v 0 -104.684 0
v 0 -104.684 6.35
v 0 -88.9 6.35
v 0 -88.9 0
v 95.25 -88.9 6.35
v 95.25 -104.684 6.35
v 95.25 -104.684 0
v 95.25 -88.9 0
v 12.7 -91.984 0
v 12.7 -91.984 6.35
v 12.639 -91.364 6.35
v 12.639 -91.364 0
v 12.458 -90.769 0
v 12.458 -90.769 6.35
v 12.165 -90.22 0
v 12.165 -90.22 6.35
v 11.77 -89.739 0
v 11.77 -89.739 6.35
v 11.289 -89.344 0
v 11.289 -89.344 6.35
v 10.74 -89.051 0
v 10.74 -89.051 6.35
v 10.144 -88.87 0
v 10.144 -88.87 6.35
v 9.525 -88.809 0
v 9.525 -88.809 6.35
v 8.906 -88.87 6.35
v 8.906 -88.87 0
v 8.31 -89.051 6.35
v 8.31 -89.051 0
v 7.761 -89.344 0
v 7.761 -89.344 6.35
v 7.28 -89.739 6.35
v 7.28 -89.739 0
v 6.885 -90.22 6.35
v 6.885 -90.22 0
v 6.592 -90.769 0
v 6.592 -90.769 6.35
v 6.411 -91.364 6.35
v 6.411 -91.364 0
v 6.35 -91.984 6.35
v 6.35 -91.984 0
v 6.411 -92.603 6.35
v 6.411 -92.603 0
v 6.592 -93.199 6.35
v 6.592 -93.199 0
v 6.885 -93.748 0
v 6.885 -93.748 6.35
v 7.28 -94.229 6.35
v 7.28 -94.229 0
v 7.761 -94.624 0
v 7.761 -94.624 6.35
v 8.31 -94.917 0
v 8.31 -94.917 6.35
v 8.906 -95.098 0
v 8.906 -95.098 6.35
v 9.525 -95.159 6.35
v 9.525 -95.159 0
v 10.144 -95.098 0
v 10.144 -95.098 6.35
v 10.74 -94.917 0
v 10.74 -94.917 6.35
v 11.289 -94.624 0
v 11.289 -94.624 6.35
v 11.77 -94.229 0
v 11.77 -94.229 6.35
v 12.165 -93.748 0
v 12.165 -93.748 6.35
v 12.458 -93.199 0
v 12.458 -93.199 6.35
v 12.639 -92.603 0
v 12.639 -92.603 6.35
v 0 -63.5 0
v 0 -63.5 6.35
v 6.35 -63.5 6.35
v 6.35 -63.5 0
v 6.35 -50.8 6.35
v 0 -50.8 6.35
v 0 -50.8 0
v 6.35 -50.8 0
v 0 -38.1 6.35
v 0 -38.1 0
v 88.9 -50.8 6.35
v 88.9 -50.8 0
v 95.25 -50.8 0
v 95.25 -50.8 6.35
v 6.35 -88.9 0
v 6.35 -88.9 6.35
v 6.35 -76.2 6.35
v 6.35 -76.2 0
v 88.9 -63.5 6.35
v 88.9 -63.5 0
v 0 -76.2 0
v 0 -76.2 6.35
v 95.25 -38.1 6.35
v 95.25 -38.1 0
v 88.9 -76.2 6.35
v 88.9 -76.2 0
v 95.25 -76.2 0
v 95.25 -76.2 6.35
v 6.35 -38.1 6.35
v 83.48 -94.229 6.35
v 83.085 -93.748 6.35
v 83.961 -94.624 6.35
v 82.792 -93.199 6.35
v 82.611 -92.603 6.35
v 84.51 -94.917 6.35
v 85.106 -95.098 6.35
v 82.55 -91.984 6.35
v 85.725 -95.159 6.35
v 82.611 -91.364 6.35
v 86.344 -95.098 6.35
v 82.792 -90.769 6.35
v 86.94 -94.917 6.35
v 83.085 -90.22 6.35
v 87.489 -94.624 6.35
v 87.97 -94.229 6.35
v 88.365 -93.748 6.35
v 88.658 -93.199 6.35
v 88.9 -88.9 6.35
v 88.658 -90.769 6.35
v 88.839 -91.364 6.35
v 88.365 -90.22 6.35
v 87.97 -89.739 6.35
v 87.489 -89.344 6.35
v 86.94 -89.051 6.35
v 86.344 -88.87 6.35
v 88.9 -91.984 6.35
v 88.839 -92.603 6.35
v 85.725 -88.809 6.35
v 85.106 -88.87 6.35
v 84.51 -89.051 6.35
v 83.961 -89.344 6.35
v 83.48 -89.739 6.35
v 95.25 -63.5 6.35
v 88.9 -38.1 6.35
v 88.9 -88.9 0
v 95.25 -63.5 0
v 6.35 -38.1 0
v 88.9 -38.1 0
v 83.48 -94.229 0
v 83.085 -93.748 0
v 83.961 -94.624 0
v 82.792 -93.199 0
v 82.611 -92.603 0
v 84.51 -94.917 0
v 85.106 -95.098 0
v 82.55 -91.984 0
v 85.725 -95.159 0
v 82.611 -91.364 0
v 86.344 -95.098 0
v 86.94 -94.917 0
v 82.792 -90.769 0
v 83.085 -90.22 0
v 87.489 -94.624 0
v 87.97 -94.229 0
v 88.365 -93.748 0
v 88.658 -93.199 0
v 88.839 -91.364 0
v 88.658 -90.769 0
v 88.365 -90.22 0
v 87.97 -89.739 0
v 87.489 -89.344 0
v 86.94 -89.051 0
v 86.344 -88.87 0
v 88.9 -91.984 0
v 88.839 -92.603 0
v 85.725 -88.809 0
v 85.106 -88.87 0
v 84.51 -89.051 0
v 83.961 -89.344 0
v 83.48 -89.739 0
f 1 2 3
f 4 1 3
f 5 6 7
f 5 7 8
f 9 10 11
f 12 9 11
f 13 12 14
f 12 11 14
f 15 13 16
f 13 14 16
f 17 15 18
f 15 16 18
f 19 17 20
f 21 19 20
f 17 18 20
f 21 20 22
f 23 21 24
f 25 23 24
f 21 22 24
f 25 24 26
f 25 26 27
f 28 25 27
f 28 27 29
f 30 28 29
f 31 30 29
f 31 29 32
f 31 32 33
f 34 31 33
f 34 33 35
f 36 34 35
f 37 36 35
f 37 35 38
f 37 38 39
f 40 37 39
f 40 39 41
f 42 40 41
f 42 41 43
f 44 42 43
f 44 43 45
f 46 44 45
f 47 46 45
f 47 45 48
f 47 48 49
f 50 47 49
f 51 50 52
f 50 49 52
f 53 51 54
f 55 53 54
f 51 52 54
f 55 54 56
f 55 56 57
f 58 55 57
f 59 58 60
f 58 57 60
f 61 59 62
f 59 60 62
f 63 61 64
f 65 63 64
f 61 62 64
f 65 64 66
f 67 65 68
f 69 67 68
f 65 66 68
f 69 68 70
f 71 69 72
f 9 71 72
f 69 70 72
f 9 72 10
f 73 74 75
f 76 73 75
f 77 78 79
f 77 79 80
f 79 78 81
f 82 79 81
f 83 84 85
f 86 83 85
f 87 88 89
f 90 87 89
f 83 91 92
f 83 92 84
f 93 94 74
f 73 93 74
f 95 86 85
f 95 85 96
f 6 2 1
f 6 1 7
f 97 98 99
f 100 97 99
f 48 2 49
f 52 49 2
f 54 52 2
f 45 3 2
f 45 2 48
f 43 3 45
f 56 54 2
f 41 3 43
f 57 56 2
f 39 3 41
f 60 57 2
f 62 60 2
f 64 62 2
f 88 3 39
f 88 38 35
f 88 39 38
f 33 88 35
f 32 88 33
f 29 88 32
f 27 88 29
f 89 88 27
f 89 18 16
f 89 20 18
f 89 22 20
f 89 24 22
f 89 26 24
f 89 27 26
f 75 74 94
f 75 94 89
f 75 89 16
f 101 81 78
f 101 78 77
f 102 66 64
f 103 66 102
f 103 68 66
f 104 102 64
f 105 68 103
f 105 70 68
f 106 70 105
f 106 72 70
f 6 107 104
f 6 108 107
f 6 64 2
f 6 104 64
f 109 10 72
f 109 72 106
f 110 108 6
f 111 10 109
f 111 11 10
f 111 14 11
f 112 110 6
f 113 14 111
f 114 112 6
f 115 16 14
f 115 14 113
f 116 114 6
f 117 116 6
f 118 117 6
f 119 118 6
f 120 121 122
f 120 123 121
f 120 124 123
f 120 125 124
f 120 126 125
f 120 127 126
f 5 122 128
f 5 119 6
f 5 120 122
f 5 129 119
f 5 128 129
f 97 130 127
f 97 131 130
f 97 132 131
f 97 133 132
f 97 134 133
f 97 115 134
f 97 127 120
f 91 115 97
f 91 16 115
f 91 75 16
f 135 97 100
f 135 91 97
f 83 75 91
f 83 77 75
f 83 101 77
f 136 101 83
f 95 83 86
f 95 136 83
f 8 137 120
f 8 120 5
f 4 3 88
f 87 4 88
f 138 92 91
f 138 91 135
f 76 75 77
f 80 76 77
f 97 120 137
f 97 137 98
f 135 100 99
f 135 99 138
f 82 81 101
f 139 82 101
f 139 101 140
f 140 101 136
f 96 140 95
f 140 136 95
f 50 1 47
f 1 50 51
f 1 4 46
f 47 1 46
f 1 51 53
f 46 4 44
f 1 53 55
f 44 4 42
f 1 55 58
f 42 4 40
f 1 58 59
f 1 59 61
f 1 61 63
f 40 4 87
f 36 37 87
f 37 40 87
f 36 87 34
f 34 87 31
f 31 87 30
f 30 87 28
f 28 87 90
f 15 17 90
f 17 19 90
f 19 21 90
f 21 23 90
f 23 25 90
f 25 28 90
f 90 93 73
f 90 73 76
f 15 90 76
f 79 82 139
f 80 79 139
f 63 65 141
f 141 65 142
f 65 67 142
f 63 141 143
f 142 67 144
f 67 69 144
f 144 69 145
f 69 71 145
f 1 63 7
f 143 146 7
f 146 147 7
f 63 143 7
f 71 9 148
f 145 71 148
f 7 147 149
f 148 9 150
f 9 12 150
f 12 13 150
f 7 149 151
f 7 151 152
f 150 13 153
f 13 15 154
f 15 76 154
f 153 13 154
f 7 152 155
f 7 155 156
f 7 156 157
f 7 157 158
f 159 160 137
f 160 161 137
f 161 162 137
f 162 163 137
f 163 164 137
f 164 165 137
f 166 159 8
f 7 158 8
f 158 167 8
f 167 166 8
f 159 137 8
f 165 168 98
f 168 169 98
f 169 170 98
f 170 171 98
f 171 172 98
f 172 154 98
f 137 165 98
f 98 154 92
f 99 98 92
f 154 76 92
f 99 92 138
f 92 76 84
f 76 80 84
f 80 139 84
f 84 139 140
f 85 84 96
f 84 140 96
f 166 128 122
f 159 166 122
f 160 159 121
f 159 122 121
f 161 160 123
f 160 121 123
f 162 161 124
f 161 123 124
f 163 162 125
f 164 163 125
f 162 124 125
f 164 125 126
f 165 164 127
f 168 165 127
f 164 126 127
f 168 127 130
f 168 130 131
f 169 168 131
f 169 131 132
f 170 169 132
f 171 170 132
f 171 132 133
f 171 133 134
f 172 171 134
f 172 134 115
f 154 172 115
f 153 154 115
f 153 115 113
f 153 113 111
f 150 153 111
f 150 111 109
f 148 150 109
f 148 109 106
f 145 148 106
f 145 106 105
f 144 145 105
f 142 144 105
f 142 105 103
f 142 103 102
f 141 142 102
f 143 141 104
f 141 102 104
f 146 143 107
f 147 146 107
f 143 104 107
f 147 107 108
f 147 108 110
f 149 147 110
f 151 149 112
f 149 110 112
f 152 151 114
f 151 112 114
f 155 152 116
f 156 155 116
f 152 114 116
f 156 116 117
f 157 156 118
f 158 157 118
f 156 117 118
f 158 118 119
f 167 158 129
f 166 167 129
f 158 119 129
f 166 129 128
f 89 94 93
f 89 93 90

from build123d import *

# Parameters (mm, degrees)
SKETCH2_W           = 95.25
SKETCH2_H           = 305.964286483
BOSS_EXTRUDE1_DEPTH = 6.35
SKETCH3_W           = 6.35
SKETCH3_H           = 12.7
CUT_EXTRUDE1_DEPTH  = 321.51057643
LPATTERN1_COUNT     = 12
LPATTERN1_PITCH     = 25.4
SKETCH4_W           = 15.875
SKETCH4_H           = 6.374255968
SKETCH4_W_2         = 12.7
CUT_EXTRUDE2_DEPTH  = 321.51057643
SKETCH5_W           = 12.7
SKETCH5_H           = 6.929808982
CUT_EXTRUDE3_DEPTH  = 321.51057643
SKETCH8_W           = 95.25
SKETCH8_H           = 0.555553013
CUT_EXTRUDE5_DEPTH  = 321.51057643
SKETCH9_W           = 69.85
SKETCH9_H           = 248.088941691
BOSS_EXTRUDE3_DEPTH = 6.35
CUT_EXTRUDE8_DEPTH  = 321.51057643
FILL_PATTERN1_DEPTH = 6.35
SKETCH9_2_W         = 69.85
SKETCH9_2_H         = 248.088941691
CUT_EXTRUDE9_DEPTH  = 6.35
SKETCH14_W          = 69.85
SKETCH14_H          = 51.238941691
BOSS_EXTRUDE4_DEPTH = 6.35
SKETCH15_W          = 69.85
SKETCH15_H          = 44.888941691
CUT_EXTRUDE11_DEPTH = 6.35
CHAMFER1_SIZE       = 3.175
SKETCH17_W          = 69.85
SKETCH17_H          = 6.35
BOSS_EXTRUDE5_DEPTH = 6.35
SKETCH18_W          = 69.85
SKETCH18_H          = 44.45
CUT_EXTRUDE12_DEPTH = 321.51057643
CHAMFER2_SIZE       = 3.175
SKETCH19_W          = 95.25
SKETCH19_H          = 105.239375395
BOSS_EXTRUDE6_DEPTH = 6.35
LPATTERN2_COUNT     = 5
LPATTERN2_PITCH     = 25.4
SKETCH20_R          = 3.175
CUT_EXTRUDE13_DEPTH = 321.51057643
SKETCH22_R          = 1.75
CUT_EXTRUDE14_DEPTH = 321.51057643
SKETCH23_W          = 95.25
SKETCH23_H          = 344.064286483
CUT_EXTRUDE15_DEPTH = 321.51057643


# Read off the part's stored shape, not the designer's step: Fill Pattern1
with BuildPart() as part:
    # Sketch2 → Boss-Extrude1 (new body)
    with BuildSketch(Plane.XY):
        with Locations((47.625, 152.982143242)):
            Rectangle(SKETCH2_W, SKETCH2_H)
    extrude(amount=BOSS_EXTRUDE1_DEPTH)

    # Sketch3 → Cut-Extrude1 (cut, through all)
    with BuildSketch(Plane.XY.offset(6.35)):
        with Locations((3.175, 19.05)):
            Rectangle(SKETCH3_W, SKETCH3_H)
        with Locations((92.075, 19.05)):
            Rectangle(SKETCH3_W, SKETCH3_H)
    cut_extrude1 = extrude(amount=-CUT_EXTRUDE1_DEPTH, mode=Mode.SUBTRACT)

    # LPattern1: Cut-Extrude1 ×12
    with Locations(*[(0, i * LPATTERN1_PITCH, 0) for i in range(1, LPATTERN1_COUNT)]):
        add(cut_extrude1, mode=Mode.SUBTRACT)

    # Sketch4 → Cut-Extrude2 (cut, through all)
    with BuildSketch(Plane.XY.offset(6.35)):
        with Locations((7.9375, 302.777158499)):
            Rectangle(SKETCH4_W, SKETCH4_H)
        with Locations((34.925, 302.777158499)):
            Rectangle(SKETCH4_W_2, SKETCH4_H)
        with Locations((87.3125, 302.777158499)):
            Rectangle(SKETCH4_W, SKETCH4_H)
        with Locations((60.325, 302.777158499)):
            Rectangle(SKETCH4_W_2, SKETCH4_H)
    extrude(amount=-CUT_EXTRUDE2_DEPTH, mode=Mode.SUBTRACT)

    # Sketch5 → Cut-Extrude3 (cut, through all)
    with BuildSketch(Plane.XY.offset(6.35)):
        with Locations((22.225, 35.336184333)):
            Rectangle(SKETCH5_W, SKETCH5_H)
        with Locations((47.625, 35.336184333)):
            Rectangle(SKETCH5_W, SKETCH5_H)
        with Locations((73.025, 35.336184333)):
            Rectangle(SKETCH5_W, SKETCH5_H)
    extrude(amount=-CUT_EXTRUDE3_DEPTH, mode=Mode.SUBTRACT)

    # Sketch8 → Cut-Extrude5 (cut, through all)
    with BuildSketch(Plane.XY.offset(6.35)):
        with Locations((47.625, 0.277776507)):
            Rectangle(SKETCH8_W, SKETCH8_H)
    extrude(amount=-CUT_EXTRUDE5_DEPTH, mode=Mode.SUBTRACT)

    # Sketch9<2> → Cut-Extrude9 (cut)
    with BuildSketch(Plane.XY.offset(6.35)):
        with Locations((47.625, 169.195559669)):
            Rectangle(SKETCH9_2_W, SKETCH9_2_H)
    extrude(amount=-CUT_EXTRUDE9_DEPTH, mode=Mode.SUBTRACT)


with BuildPart() as body_2:
    # Sketch9 → Boss-Extrude3 (new body)
    with BuildSketch(Plane.XY.offset(6.35)):
        with Locations((47.625, 169.195559669)):
            Rectangle(SKETCH9_W, SKETCH9_H)
    extrude(amount=-BOSS_EXTRUDE3_DEPTH)

    # Sketch12 → Cut-Extrude8 (cut, through all)
    with BuildSketch(Plane.XY.offset(6.35)):
        Polygon((42.125738686, 280.540030515), (36.626477372, 271.015030515), (42.125738686, 261.490030515), (53.124261314, 261.490030515), (58.623522628, 271.015030515), (53.124261314, 280.540030515), align=None)
    extrude(amount=-CUT_EXTRUDE8_DEPTH, mode=Mode.SUBTRACT)

    # Fill Pattern1 outline → Fill Pattern1 (cut)
    with BuildSketch(Plane.XY):
        Polygon((75.12130657, 223.390030515), (80.620567884, 232.915030515), (75.12130657, 242.440030515), (64.122783942, 242.440030515), (58.623522628, 232.915030515), (64.122783942, 223.390030515), align=None)
        Polygon((20.12869343, 223.390030515), (31.127216058, 223.390030515), (36.626477372, 232.915030515), (31.127216058, 242.440030515), (20.12869343, 242.440030515), (14.629432116, 232.915030515), align=None)
        Polygon((12.7, 198.156904969), (12.7, 191.47315606), (14.629432116, 194.815030515), align=None)
        Polygon((14.629432116, 169.415030515), (12.7, 172.756904969), (12.7, 166.07315606), align=None)
        Polygon((12.7, 223.556904969), (12.7, 216.87315606), (14.629432116, 220.215030515), align=None)
        Polygon((14.629432116, 144.015030515), (12.7, 147.356904969), (12.7, 140.67315606), align=None)
        Polygon((12.7, 248.956904969), (12.7, 242.27315606), (14.629432116, 245.615030515), align=None)
        Polygon((14.629432116, 118.615030515), (12.7, 121.956904969), (12.7, 115.27315606), align=None)
        Polygon((12.7, 274.356904969), (12.7, 267.67315606), (14.629432116, 271.015030515), align=None)
        Polygon((14.629432116, 93.215030515), (12.7, 96.556904969), (12.7, 89.87315606), align=None)
        Polygon((12.7, 293.240030515), (12.7, 293.07315606), (12.796345011, 293.240030515), align=None)
        Polygon((14.629432116, 67.815030515), (12.7, 71.156904969), (12.7, 64.47315606), align=None)
        Polygon((31.127216058, 293.240030515), (20.12869343, 293.240030515), (14.629432116, 283.715030515), (20.12869343, 274.190030515), (31.127216058, 274.190030515), (36.626477372, 283.715030515), align=None)
        Polygon((56.790435523, 293.240030515), (38.459564477, 293.240030515), (42.125738686, 286.890030515), (53.124261314, 286.890030515), align=None)
        Polygon((42.125738686, 51.940030515), (38.206141373, 45.151088824), (57.043858627, 45.151088824), (53.124261314, 51.940030515), align=None)
        Polygon((75.12130657, 293.240030515), (64.122783942, 293.240030515), (58.623522628, 283.715030515), (64.122783942, 274.190030515), (75.12130657, 274.190030515), (80.620567884, 283.715030515), align=None)
        Polygon((82.55, 45.756904969), (82.200231885, 45.151088824), (82.55, 45.151088824), align=None)
        Polygon((82.55, 293.240030515), (82.453654989, 293.240030515), (82.55, 293.07315606), align=None)
        Polygon((80.620567884, 67.815030515), (82.55, 64.47315606), (82.55, 71.156904969), align=None)
        Polygon((82.55, 267.67315606), (82.55, 274.356904969), (80.620567884, 271.015030515), align=None)
        Polygon((80.620567884, 93.215030515), (82.55, 89.87315606), (82.55, 96.556904969), align=None)
        Polygon((82.55, 242.27315606), (82.55, 248.956904969), (80.620567884, 245.615030515), align=None)
        Polygon((80.620567884, 118.615030515), (82.55, 115.27315606), (82.55, 121.956904969), align=None)
        Polygon((82.55, 216.87315606), (82.55, 223.556904969), (80.620567884, 220.215030515), align=None)
        Polygon((80.620567884, 144.015030515), (82.55, 140.67315606), (82.55, 147.356904969), align=None)
        Polygon((82.55, 191.47315606), (82.55, 198.156904969), (80.620567884, 194.815030515), align=None)
        Polygon((80.620567884, 169.415030515), (82.55, 166.07315606), (82.55, 172.756904969), align=None)
        Polygon((20.12869343, 248.790030515), (31.127216058, 248.790030515), (36.626477372, 258.315030515), (31.127216058, 267.840030515), (20.12869343, 267.840030515), (14.629432116, 258.315030515), align=None)
        Polygon((64.122783942, 267.840030515), (58.623522628, 258.315030515), (64.122783942, 248.790030515), (75.12130657, 248.790030515), (80.620567884, 258.315030515), (75.12130657, 267.840030515), align=None)
        Polygon((42.125738686, 236.090030515), (53.124261314, 236.090030515), (58.623522628, 245.615030515), (53.124261314, 255.140030515), (42.125738686, 255.140030515), (36.626477372, 245.615030515), align=None)
        Polygon((20.12869343, 197.990030515), (31.127216058, 197.990030515), (36.626477372, 207.515030515), (31.127216058, 217.040030515), (20.12869343, 217.040030515), (14.629432116, 207.515030515), align=None)
        Polygon((53.124261314, 204.340030515), (42.125738686, 204.340030515), (36.626477372, 194.815030515), (42.125738686, 185.290030515), (53.124261314, 185.290030515), (58.623522628, 194.815030515), align=None)
        Polygon((31.127216058, 166.240030515), (20.12869343, 166.240030515), (14.629432116, 156.715030515), (20.12869343, 147.190030515), (31.127216058, 147.190030515), (36.626477372, 156.715030515), align=None)
        Polygon((75.12130657, 197.990030515), (80.620567884, 207.515030515), (75.12130657, 217.040030515), (64.122783942, 217.040030515), (58.623522628, 207.515030515), (64.122783942, 197.990030515), align=None)
        Polygon((42.125738686, 210.690030515), (53.124261314, 210.690030515), (58.623522628, 220.215030515), (53.124261314, 229.740030515), (42.125738686, 229.740030515), (36.626477372, 220.215030515), align=None)
        Polygon((20.12869343, 172.590030515), (31.127216058, 172.590030515), (36.626477372, 182.115030515), (31.127216058, 191.640030515), (20.12869343, 191.640030515), (14.629432116, 182.115030515), align=None)
        Polygon((53.124261314, 178.940030515), (42.125738686, 178.940030515), (36.626477372, 169.415030515), (42.125738686, 159.890030515), (53.124261314, 159.890030515), (58.623522628, 169.415030515), align=None)
        Polygon((31.127216058, 140.840030515), (20.12869343, 140.840030515), (14.629432116, 131.315030515), (20.12869343, 121.790030515), (31.127216058, 121.790030515), (36.626477372, 131.315030515), align=None)
        Polygon((75.12130657, 147.190030515), (80.620567884, 156.715030515), (75.12130657, 166.240030515), (64.122783942, 166.240030515), (58.623522628, 156.715030515), (64.122783942, 147.190030515), align=None)
        Polygon((75.12130657, 172.590030515), (80.620567884, 182.115030515), (75.12130657, 191.640030515), (64.122783942, 191.640030515), (58.623522628, 182.115030515), (64.122783942, 172.590030515), align=None)
        Polygon((53.124261314, 153.540030515), (42.125738686, 153.540030515), (36.626477372, 144.015030515), (42.125738686, 134.490030515), (53.124261314, 134.490030515), (58.623522628, 144.015030515), align=None)
        Polygon((31.127216058, 115.440030515), (20.12869343, 115.440030515), (14.629432116, 105.915030515), (20.12869343, 96.390030515), (31.127216058, 96.390030515), (36.626477372, 105.915030515), align=None)
        Polygon((75.12130657, 121.790030515), (80.620567884, 131.315030515), (75.12130657, 140.840030515), (64.122783942, 140.840030515), (58.623522628, 131.315030515), (64.122783942, 121.790030515), align=None)
        Polygon((53.124261314, 128.140030515), (42.125738686, 128.140030515), (36.626477372, 118.615030515), (42.125738686, 109.090030515), (53.124261314, 109.090030515), (58.623522628, 118.615030515), align=None)
        Polygon((31.127216058, 90.040030515), (20.12869343, 90.040030515), (14.629432116, 80.515030515), (20.12869343, 70.990030515), (31.127216058, 70.990030515), (36.626477372, 80.515030515), align=None)
        Polygon((75.12130657, 96.390030515), (80.620567884, 105.915030515), (75.12130657, 115.440030515), (64.122783942, 115.440030515), (58.623522628, 105.915030515), (64.122783942, 96.390030515), align=None)
        Polygon((53.124261314, 102.740030515), (42.125738686, 102.740030515), (36.626477372, 93.215030515), (42.125738686, 83.690030515), (53.124261314, 83.690030515), (58.623522628, 93.215030515), align=None)
        Polygon((31.127216058, 64.640030515), (20.12869343, 64.640030515), (14.629432116, 55.115030515), (20.12869343, 45.590030515), (31.127216058, 45.590030515), (36.626477372, 55.115030515), align=None)
        Polygon((75.12130657, 70.990030515), (80.620567884, 80.515030515), (75.12130657, 90.040030515), (64.122783942, 90.040030515), (58.623522628, 80.515030515), (64.122783942, 70.990030515), align=None)
        Polygon((53.124261314, 77.340030515), (42.125738686, 77.340030515), (36.626477372, 67.815030515), (42.125738686, 58.290030515), (53.124261314, 58.290030515), (58.623522628, 67.815030515), align=None)
        Polygon((75.12130657, 45.590030515), (80.620567884, 55.115030515), (75.12130657, 64.640030515), (64.122783942, 64.640030515), (58.623522628, 55.115030515), (64.122783942, 45.590030515), align=None)
    extrude(amount=FILL_PATTERN1_DEPTH, mode=Mode.SUBTRACT)

    # Combine1: union part
    add(part.part)

    # Sketch14 → Boss-Extrude4 (add, through all)
    with BuildSketch(Plane.XY.offset(6.35)):
        with Locations((47.625, 70.77055967)):
            Rectangle(SKETCH14_W, SKETCH14_H)
    extrude(amount=-BOSS_EXTRUDE4_DEPTH)

    # Sketch15 → Cut-Extrude11 (cut)
    with BuildSketch(Plane.XY.offset(6.35)):
        with Locations((47.625, 67.59555967)):
            Rectangle(SKETCH15_W, SKETCH15_H)
    extrude(amount=-CUT_EXTRUDE11_DEPTH, mode=Mode.SUBTRACT)

    # Chamfer1
    chamfer1_edges = [body_2.edges().sort_by_distance(p)[0] for p in [
        (12.7, 45.151088824, 3.175),
        (12.7, 90.040030515, 3.175),
        (82.55, 90.040030515, 3.175),
        (82.55, 45.151088824, 3.175),
    ]]
    chamfer(chamfer1_edges, length=CHAMFER1_SIZE)

    # Sketch17 → Boss-Extrude5 (add, through all)
    with BuildSketch(Plane.XY.offset(6.35)):
        with Locations((47.625, 245.615030515)):
            Rectangle(SKETCH17_W, SKETCH17_H)
    extrude(amount=-BOSS_EXTRUDE5_DEPTH)

    # Sketch18 → Cut-Extrude12 (cut, through all)
    with BuildSketch(Plane.XY.offset(6.35)):
        with Locations((47.625, 271.015030515)):
            Rectangle(SKETCH18_W, SKETCH18_H)
    extrude(amount=-CUT_EXTRUDE12_DEPTH, mode=Mode.SUBTRACT)

    # Chamfer2
    chamfer2_edges = [body_2.edges().sort_by_distance(p)[0] for p in [
        (82.55, 293.240030515, 3.175),
        (12.7, 293.240030515, 3.175),
        (12.7, 248.790030515, 3.175),
        (82.55, 248.790030515, 3.175),
    ]]
    chamfer(chamfer2_edges, length=CHAMFER2_SIZE)

    # Sketch19 → Boss-Extrude6 (add)
    with BuildSketch(Plane.XY.offset(6.35)):
        with Locations((47.625, -52.064134685)):
            Rectangle(SKETCH19_W, SKETCH19_H)
    extrude(amount=-BOSS_EXTRUDE6_DEPTH)

    # LPattern2: Cut-Extrude1 ×5
    with Locations(*[(0, -i * LPATTERN2_PITCH, 0) for i in range(1, LPATTERN2_COUNT)]):
        add(cut_extrude1, mode=Mode.SUBTRACT)

    # Sketch20 → Cut-Extrude13 (cut, through all)
    with BuildSketch(Plane.XY.offset(6.35)):
        with Locations((9.525, -91.983822382)):
            Circle(SKETCH20_R)
        with Locations((85.725, -91.983822382)):
            Circle(SKETCH20_R)
    extrude(amount=-CUT_EXTRUDE13_DEPTH, mode=Mode.SUBTRACT)

    # Sketch22 → Cut-Extrude14 (cut, through all)
    with BuildSketch(Plane.XY.offset(6.35)):
        with Locations((25.4, 0)):
            Circle(SKETCH22_R)
        with Locations((69.85, 0)):
            Circle(SKETCH22_R)
    extrude(amount=-CUT_EXTRUDE14_DEPTH, mode=Mode.SUBTRACT)

    # Sketch23 → Cut-Extrude15 (cut, through all)
    with BuildSketch(Plane.XY.offset(6.35)):
        with Locations((47.625, 133.932143242)):
            Rectangle(SKETCH23_W, SKETCH23_H)
    extrude(amount=-CUT_EXTRUDE15_DEPTH, mode=Mode.SUBTRACT)


solid = body_2.part
